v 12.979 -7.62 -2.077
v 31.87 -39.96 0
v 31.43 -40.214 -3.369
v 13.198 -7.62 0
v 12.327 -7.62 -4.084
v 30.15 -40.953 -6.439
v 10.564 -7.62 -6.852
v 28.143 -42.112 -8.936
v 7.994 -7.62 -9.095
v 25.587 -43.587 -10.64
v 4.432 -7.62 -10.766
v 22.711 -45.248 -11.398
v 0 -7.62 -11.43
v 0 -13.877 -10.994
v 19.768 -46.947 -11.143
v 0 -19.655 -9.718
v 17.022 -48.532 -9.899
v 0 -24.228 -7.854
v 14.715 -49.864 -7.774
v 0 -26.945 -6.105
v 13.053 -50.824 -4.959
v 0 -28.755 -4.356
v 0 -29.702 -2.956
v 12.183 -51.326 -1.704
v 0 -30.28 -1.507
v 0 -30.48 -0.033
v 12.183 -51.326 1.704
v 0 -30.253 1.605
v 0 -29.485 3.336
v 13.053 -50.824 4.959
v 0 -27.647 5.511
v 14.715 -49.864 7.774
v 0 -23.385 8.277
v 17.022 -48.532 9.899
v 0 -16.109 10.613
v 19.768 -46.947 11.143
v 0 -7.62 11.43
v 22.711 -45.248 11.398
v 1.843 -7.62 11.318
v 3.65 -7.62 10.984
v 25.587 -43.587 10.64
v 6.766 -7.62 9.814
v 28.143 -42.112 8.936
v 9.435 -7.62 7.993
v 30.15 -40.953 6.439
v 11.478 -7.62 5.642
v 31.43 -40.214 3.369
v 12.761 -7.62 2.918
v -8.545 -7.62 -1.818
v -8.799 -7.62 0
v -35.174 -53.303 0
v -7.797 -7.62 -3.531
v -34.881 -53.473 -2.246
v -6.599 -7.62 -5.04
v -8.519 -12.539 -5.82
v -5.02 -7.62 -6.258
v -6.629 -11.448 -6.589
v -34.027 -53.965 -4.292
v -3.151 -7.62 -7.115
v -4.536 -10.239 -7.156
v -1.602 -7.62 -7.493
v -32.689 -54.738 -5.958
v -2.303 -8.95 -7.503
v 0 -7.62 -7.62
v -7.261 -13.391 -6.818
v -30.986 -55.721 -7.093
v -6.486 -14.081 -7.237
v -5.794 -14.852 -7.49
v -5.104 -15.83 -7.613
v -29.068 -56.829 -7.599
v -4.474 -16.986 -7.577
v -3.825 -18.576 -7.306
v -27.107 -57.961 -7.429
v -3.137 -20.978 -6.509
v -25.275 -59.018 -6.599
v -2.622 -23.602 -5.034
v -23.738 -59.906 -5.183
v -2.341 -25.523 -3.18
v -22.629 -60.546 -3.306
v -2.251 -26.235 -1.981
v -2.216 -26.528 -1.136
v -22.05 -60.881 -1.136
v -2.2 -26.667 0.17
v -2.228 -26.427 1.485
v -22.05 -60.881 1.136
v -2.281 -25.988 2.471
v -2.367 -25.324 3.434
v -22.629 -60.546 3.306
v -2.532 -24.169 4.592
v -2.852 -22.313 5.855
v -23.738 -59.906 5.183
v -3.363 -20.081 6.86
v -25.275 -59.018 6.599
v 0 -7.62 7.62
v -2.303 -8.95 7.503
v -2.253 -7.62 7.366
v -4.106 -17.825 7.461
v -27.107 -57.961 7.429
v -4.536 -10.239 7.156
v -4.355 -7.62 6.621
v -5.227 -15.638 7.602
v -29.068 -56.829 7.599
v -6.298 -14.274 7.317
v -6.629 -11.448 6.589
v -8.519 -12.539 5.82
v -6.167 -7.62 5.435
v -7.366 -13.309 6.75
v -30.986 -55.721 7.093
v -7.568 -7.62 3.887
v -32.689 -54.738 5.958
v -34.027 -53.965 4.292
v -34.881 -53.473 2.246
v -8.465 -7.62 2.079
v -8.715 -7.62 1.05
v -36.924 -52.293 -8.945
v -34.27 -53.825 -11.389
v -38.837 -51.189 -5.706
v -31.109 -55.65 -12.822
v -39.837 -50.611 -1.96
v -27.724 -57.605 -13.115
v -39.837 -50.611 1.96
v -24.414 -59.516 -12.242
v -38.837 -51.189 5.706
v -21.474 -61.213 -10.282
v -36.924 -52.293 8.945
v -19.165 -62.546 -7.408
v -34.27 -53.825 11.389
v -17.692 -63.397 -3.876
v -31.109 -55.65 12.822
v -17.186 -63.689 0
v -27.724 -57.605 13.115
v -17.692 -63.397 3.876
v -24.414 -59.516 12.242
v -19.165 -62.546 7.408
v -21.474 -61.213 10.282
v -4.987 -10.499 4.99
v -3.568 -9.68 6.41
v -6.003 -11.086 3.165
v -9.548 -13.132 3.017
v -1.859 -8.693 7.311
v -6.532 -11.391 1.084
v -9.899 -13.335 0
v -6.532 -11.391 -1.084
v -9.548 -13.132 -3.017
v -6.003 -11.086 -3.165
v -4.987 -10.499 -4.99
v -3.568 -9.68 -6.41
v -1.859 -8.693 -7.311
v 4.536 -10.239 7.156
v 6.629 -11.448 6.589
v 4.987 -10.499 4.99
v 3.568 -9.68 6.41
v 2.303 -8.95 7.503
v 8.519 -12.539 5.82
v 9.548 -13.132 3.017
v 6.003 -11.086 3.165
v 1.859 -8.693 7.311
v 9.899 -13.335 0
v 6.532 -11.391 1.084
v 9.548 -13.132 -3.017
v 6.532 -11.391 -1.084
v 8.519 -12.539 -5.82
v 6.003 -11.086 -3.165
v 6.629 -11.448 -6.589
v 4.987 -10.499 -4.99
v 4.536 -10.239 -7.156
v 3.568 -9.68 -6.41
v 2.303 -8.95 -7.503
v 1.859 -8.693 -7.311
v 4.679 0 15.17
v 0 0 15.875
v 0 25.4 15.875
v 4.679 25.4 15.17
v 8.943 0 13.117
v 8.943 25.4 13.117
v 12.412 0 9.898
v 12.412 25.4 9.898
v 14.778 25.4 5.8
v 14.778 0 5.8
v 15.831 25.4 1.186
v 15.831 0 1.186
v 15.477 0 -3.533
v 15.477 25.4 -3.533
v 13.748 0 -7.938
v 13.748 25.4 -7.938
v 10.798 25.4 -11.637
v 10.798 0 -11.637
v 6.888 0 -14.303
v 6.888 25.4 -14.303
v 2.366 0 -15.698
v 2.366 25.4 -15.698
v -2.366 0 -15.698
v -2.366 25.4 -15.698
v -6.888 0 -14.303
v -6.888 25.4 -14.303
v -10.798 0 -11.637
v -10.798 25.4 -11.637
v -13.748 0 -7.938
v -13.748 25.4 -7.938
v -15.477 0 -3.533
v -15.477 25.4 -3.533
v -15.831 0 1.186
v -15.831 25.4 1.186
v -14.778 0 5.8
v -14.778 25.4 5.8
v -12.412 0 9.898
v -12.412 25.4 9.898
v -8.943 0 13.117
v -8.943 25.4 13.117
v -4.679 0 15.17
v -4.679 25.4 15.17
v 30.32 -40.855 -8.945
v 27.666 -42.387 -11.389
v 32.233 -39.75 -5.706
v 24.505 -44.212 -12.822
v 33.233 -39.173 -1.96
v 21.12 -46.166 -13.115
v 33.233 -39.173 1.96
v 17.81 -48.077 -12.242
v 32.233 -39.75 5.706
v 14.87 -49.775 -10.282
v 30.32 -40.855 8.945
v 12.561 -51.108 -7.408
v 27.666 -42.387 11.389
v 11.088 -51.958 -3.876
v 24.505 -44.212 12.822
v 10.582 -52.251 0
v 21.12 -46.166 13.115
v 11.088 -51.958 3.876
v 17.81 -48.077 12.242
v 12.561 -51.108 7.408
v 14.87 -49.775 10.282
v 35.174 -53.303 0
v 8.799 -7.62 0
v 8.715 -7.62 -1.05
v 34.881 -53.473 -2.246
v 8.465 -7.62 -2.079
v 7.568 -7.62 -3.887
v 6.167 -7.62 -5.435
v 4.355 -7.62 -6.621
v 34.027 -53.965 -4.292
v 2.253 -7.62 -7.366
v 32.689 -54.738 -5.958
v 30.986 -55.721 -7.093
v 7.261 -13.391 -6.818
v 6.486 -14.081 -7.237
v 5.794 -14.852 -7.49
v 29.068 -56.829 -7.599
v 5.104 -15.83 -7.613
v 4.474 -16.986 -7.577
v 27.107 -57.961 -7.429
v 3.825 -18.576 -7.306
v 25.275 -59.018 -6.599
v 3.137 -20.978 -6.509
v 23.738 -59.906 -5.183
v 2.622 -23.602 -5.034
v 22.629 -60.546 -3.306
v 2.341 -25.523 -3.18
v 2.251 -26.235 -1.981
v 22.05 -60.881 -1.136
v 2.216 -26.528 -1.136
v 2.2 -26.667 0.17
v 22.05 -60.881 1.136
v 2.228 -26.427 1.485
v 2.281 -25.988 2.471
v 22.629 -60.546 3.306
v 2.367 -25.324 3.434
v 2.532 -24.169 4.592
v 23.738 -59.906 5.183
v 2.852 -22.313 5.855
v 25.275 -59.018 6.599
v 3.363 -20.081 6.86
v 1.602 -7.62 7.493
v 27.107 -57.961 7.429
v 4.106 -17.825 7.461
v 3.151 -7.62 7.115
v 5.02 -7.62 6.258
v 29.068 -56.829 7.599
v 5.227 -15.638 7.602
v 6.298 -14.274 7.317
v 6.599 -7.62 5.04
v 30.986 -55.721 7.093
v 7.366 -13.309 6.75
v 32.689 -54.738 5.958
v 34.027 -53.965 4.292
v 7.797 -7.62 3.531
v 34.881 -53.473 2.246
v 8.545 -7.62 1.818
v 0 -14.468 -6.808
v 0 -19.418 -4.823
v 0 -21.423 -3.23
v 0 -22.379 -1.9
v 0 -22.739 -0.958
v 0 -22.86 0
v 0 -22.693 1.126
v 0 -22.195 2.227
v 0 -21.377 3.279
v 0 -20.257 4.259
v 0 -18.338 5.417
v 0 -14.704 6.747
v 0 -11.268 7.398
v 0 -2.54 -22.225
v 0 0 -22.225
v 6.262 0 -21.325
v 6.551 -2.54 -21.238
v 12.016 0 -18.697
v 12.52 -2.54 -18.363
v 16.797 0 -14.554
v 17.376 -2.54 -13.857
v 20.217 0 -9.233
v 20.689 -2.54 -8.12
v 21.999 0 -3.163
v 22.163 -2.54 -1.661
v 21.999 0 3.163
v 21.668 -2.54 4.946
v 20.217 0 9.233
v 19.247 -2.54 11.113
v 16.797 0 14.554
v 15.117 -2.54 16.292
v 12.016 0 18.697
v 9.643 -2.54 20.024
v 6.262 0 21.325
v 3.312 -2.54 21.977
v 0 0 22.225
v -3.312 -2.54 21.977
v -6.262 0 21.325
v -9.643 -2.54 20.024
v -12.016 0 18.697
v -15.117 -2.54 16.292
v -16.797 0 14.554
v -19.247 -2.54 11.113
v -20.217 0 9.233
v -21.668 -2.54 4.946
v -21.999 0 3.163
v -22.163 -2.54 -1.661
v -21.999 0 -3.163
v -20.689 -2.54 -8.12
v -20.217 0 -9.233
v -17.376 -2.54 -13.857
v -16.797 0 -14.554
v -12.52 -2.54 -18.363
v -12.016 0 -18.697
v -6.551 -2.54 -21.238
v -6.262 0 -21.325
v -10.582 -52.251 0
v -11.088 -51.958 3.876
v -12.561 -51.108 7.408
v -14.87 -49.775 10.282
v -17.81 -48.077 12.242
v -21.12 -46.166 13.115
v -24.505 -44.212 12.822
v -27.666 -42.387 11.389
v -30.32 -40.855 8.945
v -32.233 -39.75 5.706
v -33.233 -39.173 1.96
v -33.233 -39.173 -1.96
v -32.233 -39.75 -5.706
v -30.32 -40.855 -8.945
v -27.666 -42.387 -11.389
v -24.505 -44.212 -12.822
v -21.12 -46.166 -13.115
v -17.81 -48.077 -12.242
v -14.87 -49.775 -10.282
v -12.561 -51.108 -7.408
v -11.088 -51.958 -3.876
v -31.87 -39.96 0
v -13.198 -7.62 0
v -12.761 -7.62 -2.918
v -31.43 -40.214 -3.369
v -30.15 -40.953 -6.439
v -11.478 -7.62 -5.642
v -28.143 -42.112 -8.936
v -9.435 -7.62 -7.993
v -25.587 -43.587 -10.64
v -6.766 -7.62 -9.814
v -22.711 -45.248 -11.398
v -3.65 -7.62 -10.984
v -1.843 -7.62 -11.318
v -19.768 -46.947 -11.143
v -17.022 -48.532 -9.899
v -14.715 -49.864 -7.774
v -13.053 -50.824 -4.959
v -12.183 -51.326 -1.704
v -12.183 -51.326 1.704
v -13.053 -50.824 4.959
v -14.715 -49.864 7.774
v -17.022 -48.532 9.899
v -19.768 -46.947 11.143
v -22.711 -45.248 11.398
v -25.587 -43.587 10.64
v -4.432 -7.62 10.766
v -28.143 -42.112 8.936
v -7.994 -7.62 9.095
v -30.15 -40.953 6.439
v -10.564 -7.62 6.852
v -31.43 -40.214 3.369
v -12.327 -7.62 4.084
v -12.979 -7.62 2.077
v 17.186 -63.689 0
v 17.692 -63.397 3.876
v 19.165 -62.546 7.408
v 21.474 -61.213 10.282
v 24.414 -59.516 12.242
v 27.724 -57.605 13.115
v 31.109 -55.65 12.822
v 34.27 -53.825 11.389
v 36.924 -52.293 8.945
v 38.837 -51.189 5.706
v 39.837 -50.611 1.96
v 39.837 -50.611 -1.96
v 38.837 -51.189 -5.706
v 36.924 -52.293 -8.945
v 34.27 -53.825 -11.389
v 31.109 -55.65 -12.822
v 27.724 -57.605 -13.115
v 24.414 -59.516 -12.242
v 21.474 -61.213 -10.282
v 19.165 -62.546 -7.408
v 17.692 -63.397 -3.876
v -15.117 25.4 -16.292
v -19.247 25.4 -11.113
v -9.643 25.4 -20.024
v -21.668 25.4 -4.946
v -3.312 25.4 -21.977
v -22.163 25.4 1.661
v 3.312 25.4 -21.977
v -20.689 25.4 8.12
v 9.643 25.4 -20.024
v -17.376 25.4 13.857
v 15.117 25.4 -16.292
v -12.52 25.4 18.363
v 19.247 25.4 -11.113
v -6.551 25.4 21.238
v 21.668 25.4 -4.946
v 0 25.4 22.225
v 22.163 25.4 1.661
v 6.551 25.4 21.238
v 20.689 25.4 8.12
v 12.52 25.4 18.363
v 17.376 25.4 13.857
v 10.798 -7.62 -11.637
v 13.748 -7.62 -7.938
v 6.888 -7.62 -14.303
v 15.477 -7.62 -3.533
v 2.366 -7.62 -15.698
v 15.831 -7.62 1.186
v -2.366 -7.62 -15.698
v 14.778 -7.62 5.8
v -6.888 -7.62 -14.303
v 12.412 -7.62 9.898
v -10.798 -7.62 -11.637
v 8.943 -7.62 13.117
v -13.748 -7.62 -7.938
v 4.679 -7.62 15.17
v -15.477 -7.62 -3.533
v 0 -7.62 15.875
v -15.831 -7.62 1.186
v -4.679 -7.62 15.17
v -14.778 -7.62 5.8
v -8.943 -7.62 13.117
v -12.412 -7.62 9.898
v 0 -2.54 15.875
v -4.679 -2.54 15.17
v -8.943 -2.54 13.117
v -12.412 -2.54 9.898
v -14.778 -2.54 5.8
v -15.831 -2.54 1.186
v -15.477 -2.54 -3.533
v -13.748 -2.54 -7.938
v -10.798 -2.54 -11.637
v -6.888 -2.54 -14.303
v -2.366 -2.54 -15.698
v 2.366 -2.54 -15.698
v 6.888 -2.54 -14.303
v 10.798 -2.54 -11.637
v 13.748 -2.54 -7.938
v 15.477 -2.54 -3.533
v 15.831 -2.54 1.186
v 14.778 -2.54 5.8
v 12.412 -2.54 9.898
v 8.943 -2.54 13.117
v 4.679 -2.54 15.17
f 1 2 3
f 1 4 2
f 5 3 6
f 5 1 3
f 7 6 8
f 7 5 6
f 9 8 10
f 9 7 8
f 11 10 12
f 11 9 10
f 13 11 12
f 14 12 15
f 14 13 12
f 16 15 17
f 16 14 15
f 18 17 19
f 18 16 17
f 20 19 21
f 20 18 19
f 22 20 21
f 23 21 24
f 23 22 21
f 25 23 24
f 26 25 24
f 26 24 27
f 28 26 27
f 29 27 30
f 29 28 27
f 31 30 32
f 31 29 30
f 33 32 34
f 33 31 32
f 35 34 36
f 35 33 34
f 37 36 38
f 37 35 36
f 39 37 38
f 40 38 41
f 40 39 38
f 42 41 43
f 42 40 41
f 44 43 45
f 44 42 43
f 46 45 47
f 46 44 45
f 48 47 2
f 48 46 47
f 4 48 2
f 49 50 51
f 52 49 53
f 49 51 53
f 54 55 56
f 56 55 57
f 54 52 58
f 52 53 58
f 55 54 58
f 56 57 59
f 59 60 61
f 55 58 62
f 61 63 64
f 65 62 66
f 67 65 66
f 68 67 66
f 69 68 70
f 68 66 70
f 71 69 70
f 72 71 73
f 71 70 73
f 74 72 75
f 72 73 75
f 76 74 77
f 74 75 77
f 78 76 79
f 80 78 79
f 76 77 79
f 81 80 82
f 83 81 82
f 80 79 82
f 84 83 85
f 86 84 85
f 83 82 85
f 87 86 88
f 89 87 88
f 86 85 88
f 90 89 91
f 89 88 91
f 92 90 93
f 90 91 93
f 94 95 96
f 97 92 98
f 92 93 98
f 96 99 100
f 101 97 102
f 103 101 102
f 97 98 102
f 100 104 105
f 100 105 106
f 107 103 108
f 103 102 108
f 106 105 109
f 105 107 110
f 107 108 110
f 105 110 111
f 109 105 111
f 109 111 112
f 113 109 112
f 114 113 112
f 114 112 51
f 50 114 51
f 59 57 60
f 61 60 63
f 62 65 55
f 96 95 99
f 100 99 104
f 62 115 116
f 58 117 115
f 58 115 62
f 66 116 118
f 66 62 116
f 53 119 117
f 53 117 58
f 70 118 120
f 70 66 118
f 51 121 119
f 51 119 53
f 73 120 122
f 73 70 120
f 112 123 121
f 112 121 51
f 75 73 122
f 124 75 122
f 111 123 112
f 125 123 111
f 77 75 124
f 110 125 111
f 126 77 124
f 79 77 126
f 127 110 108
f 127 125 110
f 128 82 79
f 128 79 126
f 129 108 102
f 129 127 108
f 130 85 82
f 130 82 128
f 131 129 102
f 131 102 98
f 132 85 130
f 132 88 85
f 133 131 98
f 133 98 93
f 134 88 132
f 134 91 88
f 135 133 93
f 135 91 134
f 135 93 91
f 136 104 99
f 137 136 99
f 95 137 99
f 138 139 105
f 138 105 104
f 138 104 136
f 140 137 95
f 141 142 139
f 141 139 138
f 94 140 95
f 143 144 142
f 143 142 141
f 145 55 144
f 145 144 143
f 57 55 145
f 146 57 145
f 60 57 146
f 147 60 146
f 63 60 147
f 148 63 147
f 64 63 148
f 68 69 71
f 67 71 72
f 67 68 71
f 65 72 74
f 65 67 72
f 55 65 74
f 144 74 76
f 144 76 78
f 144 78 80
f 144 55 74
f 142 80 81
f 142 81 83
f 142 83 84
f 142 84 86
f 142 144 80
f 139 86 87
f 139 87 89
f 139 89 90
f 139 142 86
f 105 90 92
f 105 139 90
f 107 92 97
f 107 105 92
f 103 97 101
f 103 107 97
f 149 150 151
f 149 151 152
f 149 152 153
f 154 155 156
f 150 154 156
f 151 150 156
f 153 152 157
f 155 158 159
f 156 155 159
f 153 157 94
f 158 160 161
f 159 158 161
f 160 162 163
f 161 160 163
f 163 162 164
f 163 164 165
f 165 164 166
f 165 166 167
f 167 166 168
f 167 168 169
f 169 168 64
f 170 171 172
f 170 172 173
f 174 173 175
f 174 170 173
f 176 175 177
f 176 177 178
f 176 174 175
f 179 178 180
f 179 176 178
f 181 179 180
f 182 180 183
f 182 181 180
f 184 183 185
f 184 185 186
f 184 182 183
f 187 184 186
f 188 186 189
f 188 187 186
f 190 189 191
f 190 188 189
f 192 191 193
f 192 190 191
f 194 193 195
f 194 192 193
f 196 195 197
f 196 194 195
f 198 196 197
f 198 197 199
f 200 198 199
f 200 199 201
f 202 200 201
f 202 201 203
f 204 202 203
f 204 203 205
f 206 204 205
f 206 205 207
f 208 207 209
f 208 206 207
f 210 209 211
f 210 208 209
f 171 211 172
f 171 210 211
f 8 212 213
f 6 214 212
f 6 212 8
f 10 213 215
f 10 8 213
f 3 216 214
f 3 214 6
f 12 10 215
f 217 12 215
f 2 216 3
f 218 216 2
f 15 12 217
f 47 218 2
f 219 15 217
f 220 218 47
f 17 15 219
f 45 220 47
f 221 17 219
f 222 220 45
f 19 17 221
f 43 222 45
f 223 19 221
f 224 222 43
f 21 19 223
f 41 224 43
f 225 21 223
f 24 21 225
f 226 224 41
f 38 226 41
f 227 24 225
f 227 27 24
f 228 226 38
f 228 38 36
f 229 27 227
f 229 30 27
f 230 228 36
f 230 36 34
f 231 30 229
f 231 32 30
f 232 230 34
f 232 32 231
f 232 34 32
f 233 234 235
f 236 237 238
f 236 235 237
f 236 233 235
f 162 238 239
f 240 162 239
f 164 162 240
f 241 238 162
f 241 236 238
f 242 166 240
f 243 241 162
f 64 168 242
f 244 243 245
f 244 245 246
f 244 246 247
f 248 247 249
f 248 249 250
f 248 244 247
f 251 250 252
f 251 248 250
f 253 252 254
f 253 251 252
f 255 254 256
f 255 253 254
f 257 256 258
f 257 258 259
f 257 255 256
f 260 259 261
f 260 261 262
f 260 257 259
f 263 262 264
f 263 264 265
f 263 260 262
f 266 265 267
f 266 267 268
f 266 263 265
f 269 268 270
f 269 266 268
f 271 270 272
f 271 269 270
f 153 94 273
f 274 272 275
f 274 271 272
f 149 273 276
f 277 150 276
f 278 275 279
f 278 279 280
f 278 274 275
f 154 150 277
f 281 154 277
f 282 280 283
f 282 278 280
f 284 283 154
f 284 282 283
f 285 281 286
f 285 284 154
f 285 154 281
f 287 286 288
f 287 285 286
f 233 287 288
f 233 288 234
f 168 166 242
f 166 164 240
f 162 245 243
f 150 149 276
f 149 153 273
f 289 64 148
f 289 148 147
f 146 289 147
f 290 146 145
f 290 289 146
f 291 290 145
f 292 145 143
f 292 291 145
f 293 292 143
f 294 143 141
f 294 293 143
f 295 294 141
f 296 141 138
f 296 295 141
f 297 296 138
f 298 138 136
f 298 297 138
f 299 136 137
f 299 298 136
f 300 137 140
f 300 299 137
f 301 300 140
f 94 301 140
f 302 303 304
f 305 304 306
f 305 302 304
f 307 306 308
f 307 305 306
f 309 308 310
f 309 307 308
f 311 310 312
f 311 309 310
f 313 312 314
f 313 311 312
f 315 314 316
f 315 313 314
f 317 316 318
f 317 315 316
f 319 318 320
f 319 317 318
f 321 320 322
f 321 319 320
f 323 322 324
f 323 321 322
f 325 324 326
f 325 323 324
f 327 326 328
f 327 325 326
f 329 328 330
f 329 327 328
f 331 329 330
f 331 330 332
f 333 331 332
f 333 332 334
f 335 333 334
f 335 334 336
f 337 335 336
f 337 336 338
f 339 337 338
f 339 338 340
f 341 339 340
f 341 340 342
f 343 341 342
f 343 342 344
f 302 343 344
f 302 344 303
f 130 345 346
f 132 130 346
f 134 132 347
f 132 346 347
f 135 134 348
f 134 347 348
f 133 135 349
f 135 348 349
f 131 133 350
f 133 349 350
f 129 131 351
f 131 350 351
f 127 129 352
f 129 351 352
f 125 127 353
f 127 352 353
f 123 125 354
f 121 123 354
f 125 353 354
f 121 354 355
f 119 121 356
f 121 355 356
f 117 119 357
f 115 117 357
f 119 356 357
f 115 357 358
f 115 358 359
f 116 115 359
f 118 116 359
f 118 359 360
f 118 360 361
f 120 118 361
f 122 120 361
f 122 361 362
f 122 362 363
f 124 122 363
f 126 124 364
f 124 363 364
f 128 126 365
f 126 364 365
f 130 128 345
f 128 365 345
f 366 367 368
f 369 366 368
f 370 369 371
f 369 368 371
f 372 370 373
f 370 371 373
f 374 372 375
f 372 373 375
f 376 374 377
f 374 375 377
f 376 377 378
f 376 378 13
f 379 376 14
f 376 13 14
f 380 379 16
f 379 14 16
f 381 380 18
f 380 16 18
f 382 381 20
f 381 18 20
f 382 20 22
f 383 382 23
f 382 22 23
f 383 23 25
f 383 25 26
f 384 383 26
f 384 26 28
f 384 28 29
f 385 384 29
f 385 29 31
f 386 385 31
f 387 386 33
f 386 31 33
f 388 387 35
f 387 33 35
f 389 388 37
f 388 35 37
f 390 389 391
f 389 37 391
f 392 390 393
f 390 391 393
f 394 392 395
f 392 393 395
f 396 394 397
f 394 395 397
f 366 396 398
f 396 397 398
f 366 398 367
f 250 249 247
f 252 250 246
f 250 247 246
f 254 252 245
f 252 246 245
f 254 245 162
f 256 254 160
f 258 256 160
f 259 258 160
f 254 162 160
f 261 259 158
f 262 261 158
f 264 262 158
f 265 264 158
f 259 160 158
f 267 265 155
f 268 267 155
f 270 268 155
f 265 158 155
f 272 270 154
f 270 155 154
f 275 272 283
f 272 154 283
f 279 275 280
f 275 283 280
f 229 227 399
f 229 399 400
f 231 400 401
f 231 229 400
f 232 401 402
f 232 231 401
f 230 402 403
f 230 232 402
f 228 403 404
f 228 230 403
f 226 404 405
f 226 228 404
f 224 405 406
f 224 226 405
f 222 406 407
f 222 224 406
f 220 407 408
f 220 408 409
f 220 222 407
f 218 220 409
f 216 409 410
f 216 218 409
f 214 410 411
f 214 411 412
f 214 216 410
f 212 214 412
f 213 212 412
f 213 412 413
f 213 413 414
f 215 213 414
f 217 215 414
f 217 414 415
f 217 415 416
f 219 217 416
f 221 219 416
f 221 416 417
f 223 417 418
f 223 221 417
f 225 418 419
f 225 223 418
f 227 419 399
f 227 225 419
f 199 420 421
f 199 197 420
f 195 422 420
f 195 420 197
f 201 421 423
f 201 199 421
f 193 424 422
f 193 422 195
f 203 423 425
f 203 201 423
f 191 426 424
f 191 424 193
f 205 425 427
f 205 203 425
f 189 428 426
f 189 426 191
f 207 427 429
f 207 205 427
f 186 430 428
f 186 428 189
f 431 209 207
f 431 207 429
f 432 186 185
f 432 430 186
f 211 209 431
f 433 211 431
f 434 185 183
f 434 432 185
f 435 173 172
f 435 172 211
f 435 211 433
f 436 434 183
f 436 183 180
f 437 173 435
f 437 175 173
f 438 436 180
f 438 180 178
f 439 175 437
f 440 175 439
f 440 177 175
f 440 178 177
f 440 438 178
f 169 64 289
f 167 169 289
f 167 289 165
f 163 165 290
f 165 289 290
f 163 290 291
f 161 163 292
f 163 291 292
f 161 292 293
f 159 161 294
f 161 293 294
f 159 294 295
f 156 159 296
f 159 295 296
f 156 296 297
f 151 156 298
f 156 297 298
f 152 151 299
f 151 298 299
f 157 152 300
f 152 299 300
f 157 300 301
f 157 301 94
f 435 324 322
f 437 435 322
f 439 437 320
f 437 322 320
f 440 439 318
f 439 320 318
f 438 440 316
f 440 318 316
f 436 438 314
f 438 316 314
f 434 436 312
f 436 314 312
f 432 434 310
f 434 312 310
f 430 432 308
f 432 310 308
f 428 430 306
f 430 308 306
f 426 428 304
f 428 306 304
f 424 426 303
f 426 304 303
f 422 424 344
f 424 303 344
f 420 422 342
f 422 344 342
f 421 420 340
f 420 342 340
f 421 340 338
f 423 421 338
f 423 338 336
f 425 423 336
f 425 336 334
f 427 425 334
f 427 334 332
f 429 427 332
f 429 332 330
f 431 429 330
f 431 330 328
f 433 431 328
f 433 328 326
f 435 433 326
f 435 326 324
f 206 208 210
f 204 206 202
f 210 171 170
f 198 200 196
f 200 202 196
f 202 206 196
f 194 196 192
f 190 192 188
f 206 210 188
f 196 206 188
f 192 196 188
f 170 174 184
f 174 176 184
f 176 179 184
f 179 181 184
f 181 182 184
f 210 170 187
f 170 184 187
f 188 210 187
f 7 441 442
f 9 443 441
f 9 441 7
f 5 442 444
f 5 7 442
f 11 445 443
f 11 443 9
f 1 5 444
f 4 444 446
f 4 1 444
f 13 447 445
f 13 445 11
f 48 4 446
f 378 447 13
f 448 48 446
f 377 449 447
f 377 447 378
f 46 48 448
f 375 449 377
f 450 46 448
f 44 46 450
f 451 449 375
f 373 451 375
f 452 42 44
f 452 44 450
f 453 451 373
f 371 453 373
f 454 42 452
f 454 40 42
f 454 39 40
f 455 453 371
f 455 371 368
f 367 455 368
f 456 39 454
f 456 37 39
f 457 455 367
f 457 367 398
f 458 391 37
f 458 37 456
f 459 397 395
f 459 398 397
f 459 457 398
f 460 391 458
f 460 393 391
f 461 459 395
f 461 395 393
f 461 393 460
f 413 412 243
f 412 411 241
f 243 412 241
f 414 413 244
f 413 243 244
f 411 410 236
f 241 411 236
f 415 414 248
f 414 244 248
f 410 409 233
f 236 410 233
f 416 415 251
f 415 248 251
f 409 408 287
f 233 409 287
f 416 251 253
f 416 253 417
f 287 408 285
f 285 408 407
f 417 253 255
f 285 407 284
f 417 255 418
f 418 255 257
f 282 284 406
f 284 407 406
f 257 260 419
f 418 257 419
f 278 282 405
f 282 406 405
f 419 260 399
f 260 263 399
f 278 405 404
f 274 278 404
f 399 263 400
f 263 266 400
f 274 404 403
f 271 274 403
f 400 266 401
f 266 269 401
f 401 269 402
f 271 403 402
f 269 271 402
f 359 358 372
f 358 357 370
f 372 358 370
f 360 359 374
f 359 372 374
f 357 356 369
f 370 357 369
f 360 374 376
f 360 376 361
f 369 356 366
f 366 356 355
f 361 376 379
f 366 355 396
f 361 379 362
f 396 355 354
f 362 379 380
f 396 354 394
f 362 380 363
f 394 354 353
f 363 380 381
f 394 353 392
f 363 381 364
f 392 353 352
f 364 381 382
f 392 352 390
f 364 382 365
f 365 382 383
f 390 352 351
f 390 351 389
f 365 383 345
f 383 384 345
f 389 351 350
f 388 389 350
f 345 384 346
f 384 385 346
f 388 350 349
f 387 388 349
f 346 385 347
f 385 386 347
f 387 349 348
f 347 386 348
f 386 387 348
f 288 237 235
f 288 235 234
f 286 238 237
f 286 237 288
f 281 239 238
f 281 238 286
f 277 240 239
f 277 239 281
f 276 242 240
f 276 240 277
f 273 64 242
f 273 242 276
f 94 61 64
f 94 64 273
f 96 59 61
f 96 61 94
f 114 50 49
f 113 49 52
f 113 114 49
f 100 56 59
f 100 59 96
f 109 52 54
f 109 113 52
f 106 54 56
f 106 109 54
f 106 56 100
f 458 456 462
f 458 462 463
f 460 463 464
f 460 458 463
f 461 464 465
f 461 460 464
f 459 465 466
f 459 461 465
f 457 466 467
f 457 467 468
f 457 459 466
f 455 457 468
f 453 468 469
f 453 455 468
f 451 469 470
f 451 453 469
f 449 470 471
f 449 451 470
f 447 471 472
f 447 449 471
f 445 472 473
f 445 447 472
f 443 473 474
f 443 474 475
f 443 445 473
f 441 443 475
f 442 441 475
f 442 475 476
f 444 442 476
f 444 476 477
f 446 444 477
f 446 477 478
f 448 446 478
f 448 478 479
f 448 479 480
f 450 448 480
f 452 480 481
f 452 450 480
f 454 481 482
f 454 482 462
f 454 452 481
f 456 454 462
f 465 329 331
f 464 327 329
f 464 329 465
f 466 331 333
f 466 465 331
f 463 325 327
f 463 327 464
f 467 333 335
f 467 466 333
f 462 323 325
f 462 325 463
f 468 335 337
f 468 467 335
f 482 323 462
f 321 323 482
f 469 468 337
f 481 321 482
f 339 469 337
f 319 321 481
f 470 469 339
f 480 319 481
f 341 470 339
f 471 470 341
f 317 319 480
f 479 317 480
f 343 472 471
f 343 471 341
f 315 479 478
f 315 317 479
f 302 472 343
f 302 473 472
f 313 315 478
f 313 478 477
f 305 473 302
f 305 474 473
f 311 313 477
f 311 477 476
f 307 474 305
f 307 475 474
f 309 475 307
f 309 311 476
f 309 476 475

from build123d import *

# Parameters (mm, degrees)
SKETCH1_R           = 22.225
SKETCH1_R_2         = 15.875
BOSS_EXTRUDE1_DEPTH = 25.4
BOSS_EXTRUDE2_START = 2.54
SKETCH2_R           = 22.225
BOSS_EXTRUDE2_DEPTH = 2.54
BOSS_EXTRUDE3_START = 5.08
SKETCH3_R           = 15.875
BOSS_EXTRUDE3_DEPTH = 5.08
BOSS_EXTRUDE4_START = -13.208
SKETCH5_R           = 13.15140871
SKETCH5_R_2         = 11.43
BOSS_EXTRUDE4_DEPTH = 13.208


with BuildPart() as part:
    # Sketch1 → Boss-Extrude1 (new body)
    with BuildSketch(Plane(origin=(0, 0, 0), x_dir=(1, 0, 0), z_dir=(0, 1, 0))):
        with Locations(Location((0, 0, 0), (0, 0, 270))):
            Circle(SKETCH1_R)
        with Locations(Location((0, 0, 0), (0, 0, 270))):
            Circle(SKETCH1_R_2, mode=Mode.SUBTRACT)
    extrude(amount=BOSS_EXTRUDE1_DEPTH)

    # Sketch2 → Boss-Extrude2 (add)
    with BuildSketch(Plane.XZ.offset(BOSS_EXTRUDE2_START)):
        with Locations(Location((0, 0, 0), (0, 0, 270))):
            Circle(SKETCH2_R)
    extrude(amount=-BOSS_EXTRUDE2_DEPTH)

    # Sketch3 → Boss-Extrude3 (add)
    with BuildSketch(Plane.XZ.offset(2.54).offset(BOSS_EXTRUDE3_START)):
        with Locations(Location((0, 0, 0), (0, 0, 90))):
            Circle(SKETCH3_R)
    extrude(amount=-BOSS_EXTRUDE3_DEPTH)

    # Sketch4 → Revolve1 (revolve)
    with BuildSketch(Plane.XY):
        Polygon((-38.473670365, -51.398351826), (-9.898670365, -1.905), (-6.599113577, -3.81), (-35.174113577, -53.303351826), align=None)
    revolve1 = revolve(axis=Axis((0, -7.62, 0), (-0.500000000000001, -0.8660254037844382, 0)))

    # Sketch5 → Boss-Extrude4 (add)
    with BuildSketch(Plane(origin=(-31.874556788, -55.208351826, 0), x_dir=(0.866025403784438, -0.5000000000000012, 0), z_dir=(-0.5000000000000011, -0.8660254037844379, 0)).offset(BOSS_EXTRUDE4_START)):
        with Locations((3.81, 0)):
            Circle(SKETCH5_R)
        with Locations(Location((3.81, 0, 0), (0, 0, 90))):
            Circle(SKETCH5_R_2, mode=Mode.SUBTRACT)
    boss_extrude4 = extrude(amount=BOSS_EXTRUDE4_DEPTH)

    # Mirror1: Revolve1, Boss-Extrude4 across plane
    add(revolve1.mirror(Plane(origin=(0, 0, 0), x_dir=(0, 0, 1), z_dir=(1, 0, 0))))
    add(boss_extrude4.mirror(Plane(origin=(0, 0, 0), x_dir=(0, 0, 1), z_dir=(1, 0, 0))))


solid = part.part
